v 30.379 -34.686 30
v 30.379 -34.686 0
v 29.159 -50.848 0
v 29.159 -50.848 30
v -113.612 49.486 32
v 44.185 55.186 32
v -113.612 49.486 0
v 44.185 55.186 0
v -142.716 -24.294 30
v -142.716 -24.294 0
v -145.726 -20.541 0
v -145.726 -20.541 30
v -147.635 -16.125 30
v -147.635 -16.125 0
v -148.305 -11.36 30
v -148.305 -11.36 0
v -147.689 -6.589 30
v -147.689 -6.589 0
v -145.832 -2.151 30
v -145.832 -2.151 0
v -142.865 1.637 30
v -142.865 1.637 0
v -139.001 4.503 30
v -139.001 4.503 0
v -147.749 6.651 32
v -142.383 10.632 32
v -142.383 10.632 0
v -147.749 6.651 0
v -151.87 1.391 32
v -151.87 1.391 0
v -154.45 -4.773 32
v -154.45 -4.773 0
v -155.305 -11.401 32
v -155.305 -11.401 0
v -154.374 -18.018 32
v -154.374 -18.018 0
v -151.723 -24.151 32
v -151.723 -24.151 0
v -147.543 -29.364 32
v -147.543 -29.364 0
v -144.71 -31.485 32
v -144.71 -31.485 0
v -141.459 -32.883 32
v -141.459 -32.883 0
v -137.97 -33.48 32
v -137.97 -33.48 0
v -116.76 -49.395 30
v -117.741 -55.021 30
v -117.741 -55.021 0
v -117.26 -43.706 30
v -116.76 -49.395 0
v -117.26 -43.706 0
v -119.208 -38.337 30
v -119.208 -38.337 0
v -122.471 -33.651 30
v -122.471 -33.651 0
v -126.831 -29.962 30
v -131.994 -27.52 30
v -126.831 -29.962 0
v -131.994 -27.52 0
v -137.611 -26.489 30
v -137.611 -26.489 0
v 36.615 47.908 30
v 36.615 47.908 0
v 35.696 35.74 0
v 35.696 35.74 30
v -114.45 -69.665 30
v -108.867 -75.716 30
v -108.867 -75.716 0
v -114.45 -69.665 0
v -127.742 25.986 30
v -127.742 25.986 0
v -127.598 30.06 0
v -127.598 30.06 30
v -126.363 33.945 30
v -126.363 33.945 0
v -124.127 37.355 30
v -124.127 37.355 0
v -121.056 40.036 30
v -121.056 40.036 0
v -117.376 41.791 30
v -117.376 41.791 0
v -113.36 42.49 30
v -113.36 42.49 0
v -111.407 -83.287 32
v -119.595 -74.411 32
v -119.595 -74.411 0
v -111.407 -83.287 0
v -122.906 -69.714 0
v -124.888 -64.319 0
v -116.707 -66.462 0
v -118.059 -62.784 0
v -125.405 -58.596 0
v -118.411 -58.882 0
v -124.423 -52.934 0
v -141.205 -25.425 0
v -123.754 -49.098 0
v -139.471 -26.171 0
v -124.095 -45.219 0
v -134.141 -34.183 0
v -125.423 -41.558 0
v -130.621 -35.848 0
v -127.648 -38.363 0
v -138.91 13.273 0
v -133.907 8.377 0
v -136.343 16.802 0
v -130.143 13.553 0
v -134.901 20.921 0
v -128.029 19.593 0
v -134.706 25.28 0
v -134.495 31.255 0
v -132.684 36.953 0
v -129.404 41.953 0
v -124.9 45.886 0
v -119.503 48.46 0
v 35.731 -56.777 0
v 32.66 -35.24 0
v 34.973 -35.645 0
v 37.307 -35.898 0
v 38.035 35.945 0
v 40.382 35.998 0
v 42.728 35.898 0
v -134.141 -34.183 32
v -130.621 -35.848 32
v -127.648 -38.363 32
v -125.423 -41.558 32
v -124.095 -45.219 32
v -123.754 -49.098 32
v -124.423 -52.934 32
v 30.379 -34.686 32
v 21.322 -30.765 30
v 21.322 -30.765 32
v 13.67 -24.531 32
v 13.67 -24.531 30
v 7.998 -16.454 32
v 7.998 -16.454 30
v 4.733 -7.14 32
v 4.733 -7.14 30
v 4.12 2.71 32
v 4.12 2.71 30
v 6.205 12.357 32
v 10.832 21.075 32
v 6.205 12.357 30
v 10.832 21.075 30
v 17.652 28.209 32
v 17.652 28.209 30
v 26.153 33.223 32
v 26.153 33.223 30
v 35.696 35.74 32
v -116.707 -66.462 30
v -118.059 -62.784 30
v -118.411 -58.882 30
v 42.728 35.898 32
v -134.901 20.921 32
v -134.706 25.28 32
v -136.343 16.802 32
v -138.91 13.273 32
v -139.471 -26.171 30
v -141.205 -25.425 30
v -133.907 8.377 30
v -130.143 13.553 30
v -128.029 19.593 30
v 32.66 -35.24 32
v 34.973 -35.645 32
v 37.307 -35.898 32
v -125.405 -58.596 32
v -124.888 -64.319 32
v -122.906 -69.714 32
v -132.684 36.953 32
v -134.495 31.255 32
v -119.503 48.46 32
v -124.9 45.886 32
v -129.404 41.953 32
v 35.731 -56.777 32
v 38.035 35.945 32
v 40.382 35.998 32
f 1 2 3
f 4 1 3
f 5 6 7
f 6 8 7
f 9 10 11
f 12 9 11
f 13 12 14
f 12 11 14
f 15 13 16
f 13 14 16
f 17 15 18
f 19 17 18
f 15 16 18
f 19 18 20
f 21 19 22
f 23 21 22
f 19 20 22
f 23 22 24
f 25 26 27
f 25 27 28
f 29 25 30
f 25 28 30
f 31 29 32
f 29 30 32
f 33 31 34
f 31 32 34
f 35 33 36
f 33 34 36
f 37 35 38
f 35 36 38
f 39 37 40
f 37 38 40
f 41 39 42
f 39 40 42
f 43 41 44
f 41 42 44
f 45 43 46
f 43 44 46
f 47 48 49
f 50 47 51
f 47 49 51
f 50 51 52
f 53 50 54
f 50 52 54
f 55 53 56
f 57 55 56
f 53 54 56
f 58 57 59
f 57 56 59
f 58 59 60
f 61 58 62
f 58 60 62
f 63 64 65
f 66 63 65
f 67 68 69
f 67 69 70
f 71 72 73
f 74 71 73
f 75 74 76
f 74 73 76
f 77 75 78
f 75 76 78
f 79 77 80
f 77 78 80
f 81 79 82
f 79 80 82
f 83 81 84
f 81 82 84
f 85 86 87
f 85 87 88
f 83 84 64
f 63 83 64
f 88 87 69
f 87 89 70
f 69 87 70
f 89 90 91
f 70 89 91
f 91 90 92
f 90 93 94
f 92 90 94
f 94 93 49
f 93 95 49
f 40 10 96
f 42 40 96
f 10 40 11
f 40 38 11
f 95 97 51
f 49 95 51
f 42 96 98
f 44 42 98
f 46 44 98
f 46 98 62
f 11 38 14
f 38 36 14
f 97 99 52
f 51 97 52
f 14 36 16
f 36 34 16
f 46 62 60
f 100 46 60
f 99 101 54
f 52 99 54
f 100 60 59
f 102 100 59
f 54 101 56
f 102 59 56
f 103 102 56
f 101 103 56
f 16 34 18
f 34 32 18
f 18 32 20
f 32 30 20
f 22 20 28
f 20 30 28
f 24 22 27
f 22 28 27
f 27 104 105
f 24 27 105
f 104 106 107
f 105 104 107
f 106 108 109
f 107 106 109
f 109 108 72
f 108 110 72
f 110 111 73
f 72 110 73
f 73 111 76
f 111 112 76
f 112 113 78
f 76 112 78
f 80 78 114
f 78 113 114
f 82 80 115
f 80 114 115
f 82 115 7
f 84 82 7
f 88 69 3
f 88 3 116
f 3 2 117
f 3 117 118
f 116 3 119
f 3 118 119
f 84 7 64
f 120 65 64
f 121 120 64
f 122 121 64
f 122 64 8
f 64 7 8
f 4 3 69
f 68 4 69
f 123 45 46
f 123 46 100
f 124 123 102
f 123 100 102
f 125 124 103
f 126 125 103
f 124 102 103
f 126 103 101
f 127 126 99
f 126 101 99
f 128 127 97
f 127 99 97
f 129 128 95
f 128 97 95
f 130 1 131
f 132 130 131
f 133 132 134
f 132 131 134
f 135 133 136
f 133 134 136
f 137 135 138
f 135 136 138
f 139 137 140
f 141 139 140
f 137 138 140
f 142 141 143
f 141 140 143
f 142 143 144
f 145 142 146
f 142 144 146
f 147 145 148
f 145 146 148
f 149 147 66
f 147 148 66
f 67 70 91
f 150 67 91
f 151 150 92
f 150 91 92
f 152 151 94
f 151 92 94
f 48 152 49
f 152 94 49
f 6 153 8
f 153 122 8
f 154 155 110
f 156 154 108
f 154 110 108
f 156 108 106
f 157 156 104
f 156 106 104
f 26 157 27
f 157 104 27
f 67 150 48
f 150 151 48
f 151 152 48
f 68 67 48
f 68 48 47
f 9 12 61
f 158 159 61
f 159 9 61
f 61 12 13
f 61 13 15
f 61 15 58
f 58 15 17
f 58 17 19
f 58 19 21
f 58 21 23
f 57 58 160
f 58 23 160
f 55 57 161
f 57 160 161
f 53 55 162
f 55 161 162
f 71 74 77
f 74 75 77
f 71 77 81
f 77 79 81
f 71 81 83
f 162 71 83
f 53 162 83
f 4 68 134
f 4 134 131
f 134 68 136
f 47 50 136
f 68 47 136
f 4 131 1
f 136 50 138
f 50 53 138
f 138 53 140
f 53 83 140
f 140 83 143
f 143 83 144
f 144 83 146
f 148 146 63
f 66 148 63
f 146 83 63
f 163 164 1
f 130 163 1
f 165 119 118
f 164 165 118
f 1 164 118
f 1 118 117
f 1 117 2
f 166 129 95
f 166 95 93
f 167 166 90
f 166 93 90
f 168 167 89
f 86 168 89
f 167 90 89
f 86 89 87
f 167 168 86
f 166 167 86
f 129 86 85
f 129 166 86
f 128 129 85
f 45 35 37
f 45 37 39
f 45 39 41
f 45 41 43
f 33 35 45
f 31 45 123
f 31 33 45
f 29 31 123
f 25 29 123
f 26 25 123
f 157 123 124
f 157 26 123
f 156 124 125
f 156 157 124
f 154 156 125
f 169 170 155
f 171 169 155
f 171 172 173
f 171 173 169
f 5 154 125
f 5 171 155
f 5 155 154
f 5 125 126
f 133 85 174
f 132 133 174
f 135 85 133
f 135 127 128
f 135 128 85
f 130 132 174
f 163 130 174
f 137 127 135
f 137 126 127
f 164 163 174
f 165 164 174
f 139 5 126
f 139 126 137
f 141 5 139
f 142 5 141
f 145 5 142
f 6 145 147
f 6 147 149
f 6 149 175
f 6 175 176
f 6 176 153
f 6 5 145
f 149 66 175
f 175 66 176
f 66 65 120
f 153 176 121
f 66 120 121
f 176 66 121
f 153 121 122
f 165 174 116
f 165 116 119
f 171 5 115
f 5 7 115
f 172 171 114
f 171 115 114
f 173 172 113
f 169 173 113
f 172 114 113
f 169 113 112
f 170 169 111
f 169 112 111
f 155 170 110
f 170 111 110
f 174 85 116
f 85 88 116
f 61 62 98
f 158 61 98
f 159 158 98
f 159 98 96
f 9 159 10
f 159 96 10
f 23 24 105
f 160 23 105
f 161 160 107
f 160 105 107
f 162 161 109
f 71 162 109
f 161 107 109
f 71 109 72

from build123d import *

# Parameters (mm, degrees)
BOSS_EXTRUDE1_DEPTH = 30
BOSS_EXTRUDE2_DEPTH = 2


with BuildPart() as part:
    # Sketch1 → Boss-Extrude1 (new body)
    with BuildSketch(Plane.XY):
        with BuildLine():
            ThreePointArc((-124.422839539, -52.93360637), (-124.888175134, -64.31939994), (-119.594822483, -74.410646153))
            Line((-119.594822483, -74.410646153), (-111.407238253, -83.286865316))
            Line((-111.407238253, -83.286865316), (35.730934718, -56.776536745))
            Line((35.730934718, -56.776536745), (37.30735825, -35.897821688))
            ThreePointArc((37.30735825, -35.897821688), (33.813482954, -35.461340503), (30.378958676, -34.685632184))
            Line((30.378958676, -34.685632184), (29.158639343, -50.847976334))
            Line((29.158639343, -50.847976334), (-108.867065108, -75.716483958))
            Line((-108.867065108, -75.716483958), (-114.449508902, -69.664516346))
            ThreePointArc((-114.449508902, -69.664516346), (-118.058612981, -62.784121201), (-117.741338712, -55.021080131))
            ThreePointArc((-117.741338712, -55.021080131), (-120.686835144, -35.887822689), (-137.611023, -26.489452883))
            ThreePointArc((-137.611023, -26.489452883), (-140.360427807, -25.849420576), (-142.716361529, -24.294285714))
            ThreePointArc((-142.716361529, -24.294285714), (-148.157403518, -8.953967174), (-139.001078611, 4.503076521))
            ThreePointArc((-139.001078611, 4.503076521), (-130.143335416, 13.552732011), (-127.741520279, 25.986040624))
            ThreePointArc((-127.741520279, 25.986040624), (-124.12688517, 37.354531527), (-113.359672518, 42.490220779))
            Line((-113.359672518, 42.490220779), (36.615125644, 47.908385572))
            Line((36.615125644, 47.908385572), (35.69634188, 35.73968597))
            ThreePointArc((35.69634188, 35.73968597), (39.20840278, 35.99090031), (42.728206295, 35.897821688))
            Line((42.728206295, 35.897821688), (44.184569482, 55.186414758))
            Line((44.184569482, 55.186414758), (-113.612397826, 49.485657143))
            ThreePointArc((-113.612397826, 49.485657143), (-129.404309715, 41.953312906), (-134.705774542, 25.279526249))
            ThreePointArc((-134.705774542, 25.279526249), (-136.343375771, 16.802270376), (-142.382746132, 10.632050724))
            ThreePointArc((-142.382746132, 10.632050724), (-155.099864059, -8.058287742), (-147.542861296, -29.364285714))
            ThreePointArc((-147.542861296, -29.364285714), (-143.125485566, -32.280163581), (-137.970351553, -33.480224156))
            ThreePointArc((-137.970351553, -33.480224156), (-126.431132561, -39.888203569), (-124.422839539, -52.93360637))
        make_face()
    extrude(amount=BOSS_EXTRUDE1_DEPTH)

    # Sketch4 → Boss-Extrude2 (add)
    with BuildSketch(Plane.XY.offset(30)):
        with BuildLine():
            ThreePointArc((37.30735825, -35.897821688), (4.119960585, 2.710424022), (42.728206295, 35.897821688))
            Line((42.728206295, 35.897821688), (44.184569482, 55.186414758))
            Line((44.184569482, 55.186414758), (-113.612397826, 49.485657143))
            ThreePointArc((-113.612397826, 49.485657143), (-129.404309715, 41.953312906), (-134.705774542, 25.279526249))
            ThreePointArc((-134.705774542, 25.279526249), (-136.343375771, 16.802270376), (-142.382746132, 10.632050724))
            ThreePointArc((-142.382746132, 10.632050724), (-155.099864059, -8.058287742), (-147.542861296, -29.364285714))
            ThreePointArc((-147.542861296, -29.364285714), (-143.125485566, -32.280163581), (-137.970351553, -33.480224156))
            ThreePointArc((-137.970351553, -33.480224156), (-126.431132561, -39.888203569), (-124.422839539, -52.93360637))
            ThreePointArc((-124.422839539, -52.93360637), (-124.888175134, -64.31939994), (-119.594822483, -74.410646153))
            Line((-119.594822483, -74.410646153), (-111.407238253, -83.286865316))
            Line((-111.407238253, -83.286865316), (35.730934718, -56.776536745))
            Line((35.730934718, -56.776536745), (37.30735825, -35.897821688))
        make_face()
    extrude(amount=BOSS_EXTRUDE2_DEPTH)


solid = part.part
